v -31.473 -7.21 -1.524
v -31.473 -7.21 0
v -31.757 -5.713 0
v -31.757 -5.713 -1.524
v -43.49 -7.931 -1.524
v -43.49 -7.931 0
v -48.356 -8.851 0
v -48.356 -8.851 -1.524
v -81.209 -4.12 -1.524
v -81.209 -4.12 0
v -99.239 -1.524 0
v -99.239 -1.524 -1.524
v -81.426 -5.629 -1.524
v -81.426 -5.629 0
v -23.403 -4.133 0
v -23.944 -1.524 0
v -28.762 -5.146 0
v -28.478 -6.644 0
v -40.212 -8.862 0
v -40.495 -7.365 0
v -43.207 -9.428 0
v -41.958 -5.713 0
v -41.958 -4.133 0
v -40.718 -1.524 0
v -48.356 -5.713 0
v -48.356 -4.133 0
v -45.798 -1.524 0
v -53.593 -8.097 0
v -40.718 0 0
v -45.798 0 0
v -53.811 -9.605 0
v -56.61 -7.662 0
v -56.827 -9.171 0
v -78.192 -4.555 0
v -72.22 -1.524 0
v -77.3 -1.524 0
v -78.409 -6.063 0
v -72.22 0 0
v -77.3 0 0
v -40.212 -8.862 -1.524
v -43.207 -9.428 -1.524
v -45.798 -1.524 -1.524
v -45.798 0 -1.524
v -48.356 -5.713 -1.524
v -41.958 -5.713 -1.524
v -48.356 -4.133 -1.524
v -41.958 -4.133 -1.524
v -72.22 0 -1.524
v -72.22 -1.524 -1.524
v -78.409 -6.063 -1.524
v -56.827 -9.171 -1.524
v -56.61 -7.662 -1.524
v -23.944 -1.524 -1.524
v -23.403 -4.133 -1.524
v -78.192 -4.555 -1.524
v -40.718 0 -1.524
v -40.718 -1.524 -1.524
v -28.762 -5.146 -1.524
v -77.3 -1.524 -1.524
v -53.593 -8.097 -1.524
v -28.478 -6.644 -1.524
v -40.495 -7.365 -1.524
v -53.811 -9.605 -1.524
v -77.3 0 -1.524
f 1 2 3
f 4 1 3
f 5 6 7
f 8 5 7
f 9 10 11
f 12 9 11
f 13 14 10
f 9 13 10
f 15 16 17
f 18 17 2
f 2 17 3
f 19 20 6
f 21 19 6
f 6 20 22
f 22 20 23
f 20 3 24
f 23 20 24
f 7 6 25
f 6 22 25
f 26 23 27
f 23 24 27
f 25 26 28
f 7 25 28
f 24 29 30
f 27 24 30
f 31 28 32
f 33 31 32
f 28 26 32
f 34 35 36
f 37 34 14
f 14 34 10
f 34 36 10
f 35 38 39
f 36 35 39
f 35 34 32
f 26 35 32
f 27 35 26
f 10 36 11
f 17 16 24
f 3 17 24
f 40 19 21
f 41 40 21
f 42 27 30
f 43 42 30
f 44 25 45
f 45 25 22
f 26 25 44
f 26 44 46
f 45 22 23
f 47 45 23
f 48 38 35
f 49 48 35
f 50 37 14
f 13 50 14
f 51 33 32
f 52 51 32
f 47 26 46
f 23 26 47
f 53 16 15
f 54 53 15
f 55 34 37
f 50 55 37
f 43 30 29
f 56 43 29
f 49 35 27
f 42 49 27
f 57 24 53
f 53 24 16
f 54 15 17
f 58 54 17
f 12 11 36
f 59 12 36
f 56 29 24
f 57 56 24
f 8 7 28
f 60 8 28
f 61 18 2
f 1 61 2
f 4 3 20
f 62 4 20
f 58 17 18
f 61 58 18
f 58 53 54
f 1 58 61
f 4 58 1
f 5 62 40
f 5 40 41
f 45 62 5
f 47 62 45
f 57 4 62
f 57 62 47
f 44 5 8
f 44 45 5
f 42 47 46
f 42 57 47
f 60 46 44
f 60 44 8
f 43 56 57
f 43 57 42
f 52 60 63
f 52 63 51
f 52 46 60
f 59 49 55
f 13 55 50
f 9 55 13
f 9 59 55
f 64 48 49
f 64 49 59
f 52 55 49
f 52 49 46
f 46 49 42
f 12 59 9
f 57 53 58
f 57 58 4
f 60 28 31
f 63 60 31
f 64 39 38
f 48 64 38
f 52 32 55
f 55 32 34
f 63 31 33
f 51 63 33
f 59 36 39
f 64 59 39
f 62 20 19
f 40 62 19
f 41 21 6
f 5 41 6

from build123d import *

# Parameters (mm, degrees)
SKETCH1_W           = 6.398334728
SKETCH1_H           = 1.579308664
BOSS_EXTRUDE1_DEPTH = 1.524


with BuildPart() as part:
    # Sketch1 → Boss-Extrude1 (new body)
    with BuildSketch(Plane.XY):
        Polygon((-23.403233798, -4.133198011), (-28.761615364, -5.146272329), (-28.478498191, -6.643743753), (-31.47344104, -7.209978099), (-31.756558213, -5.712506675), (-40.495294208, -7.364682597), (-40.212177035, -8.862154021), (-43.207119883, -9.428388367), (-43.490237056, -7.930916943), (-48.355985293, -8.850852284), (-53.593355447, -8.096704042), (-53.810561584, -9.605146117), (-56.827445734, -9.170733844), (-56.610239597, -7.662291769), (-78.191926721, -4.554665056), (-78.409132858, -6.063107132), (-81.426017008, -5.628694858), (-81.208810872, -4.120252783), (-99.239134473, -1.524), (-77.300143281, -1.524), (-77.300143281, 0), (-72.220143281, 0), (-72.220143281, -1.524), (-45.797700006, -1.524), (-45.797700006, 0), (-40.717700006, 0), (-40.717700006, -1.524), (-23.943865748, -1.524), align=None)
        with Locations((-45.156817929, -4.922852343)):
            Rectangle(SKETCH1_W, SKETCH1_H, mode=Mode.SUBTRACT)
    extrude(amount=-BOSS_EXTRUDE1_DEPTH)


solid = part.part
